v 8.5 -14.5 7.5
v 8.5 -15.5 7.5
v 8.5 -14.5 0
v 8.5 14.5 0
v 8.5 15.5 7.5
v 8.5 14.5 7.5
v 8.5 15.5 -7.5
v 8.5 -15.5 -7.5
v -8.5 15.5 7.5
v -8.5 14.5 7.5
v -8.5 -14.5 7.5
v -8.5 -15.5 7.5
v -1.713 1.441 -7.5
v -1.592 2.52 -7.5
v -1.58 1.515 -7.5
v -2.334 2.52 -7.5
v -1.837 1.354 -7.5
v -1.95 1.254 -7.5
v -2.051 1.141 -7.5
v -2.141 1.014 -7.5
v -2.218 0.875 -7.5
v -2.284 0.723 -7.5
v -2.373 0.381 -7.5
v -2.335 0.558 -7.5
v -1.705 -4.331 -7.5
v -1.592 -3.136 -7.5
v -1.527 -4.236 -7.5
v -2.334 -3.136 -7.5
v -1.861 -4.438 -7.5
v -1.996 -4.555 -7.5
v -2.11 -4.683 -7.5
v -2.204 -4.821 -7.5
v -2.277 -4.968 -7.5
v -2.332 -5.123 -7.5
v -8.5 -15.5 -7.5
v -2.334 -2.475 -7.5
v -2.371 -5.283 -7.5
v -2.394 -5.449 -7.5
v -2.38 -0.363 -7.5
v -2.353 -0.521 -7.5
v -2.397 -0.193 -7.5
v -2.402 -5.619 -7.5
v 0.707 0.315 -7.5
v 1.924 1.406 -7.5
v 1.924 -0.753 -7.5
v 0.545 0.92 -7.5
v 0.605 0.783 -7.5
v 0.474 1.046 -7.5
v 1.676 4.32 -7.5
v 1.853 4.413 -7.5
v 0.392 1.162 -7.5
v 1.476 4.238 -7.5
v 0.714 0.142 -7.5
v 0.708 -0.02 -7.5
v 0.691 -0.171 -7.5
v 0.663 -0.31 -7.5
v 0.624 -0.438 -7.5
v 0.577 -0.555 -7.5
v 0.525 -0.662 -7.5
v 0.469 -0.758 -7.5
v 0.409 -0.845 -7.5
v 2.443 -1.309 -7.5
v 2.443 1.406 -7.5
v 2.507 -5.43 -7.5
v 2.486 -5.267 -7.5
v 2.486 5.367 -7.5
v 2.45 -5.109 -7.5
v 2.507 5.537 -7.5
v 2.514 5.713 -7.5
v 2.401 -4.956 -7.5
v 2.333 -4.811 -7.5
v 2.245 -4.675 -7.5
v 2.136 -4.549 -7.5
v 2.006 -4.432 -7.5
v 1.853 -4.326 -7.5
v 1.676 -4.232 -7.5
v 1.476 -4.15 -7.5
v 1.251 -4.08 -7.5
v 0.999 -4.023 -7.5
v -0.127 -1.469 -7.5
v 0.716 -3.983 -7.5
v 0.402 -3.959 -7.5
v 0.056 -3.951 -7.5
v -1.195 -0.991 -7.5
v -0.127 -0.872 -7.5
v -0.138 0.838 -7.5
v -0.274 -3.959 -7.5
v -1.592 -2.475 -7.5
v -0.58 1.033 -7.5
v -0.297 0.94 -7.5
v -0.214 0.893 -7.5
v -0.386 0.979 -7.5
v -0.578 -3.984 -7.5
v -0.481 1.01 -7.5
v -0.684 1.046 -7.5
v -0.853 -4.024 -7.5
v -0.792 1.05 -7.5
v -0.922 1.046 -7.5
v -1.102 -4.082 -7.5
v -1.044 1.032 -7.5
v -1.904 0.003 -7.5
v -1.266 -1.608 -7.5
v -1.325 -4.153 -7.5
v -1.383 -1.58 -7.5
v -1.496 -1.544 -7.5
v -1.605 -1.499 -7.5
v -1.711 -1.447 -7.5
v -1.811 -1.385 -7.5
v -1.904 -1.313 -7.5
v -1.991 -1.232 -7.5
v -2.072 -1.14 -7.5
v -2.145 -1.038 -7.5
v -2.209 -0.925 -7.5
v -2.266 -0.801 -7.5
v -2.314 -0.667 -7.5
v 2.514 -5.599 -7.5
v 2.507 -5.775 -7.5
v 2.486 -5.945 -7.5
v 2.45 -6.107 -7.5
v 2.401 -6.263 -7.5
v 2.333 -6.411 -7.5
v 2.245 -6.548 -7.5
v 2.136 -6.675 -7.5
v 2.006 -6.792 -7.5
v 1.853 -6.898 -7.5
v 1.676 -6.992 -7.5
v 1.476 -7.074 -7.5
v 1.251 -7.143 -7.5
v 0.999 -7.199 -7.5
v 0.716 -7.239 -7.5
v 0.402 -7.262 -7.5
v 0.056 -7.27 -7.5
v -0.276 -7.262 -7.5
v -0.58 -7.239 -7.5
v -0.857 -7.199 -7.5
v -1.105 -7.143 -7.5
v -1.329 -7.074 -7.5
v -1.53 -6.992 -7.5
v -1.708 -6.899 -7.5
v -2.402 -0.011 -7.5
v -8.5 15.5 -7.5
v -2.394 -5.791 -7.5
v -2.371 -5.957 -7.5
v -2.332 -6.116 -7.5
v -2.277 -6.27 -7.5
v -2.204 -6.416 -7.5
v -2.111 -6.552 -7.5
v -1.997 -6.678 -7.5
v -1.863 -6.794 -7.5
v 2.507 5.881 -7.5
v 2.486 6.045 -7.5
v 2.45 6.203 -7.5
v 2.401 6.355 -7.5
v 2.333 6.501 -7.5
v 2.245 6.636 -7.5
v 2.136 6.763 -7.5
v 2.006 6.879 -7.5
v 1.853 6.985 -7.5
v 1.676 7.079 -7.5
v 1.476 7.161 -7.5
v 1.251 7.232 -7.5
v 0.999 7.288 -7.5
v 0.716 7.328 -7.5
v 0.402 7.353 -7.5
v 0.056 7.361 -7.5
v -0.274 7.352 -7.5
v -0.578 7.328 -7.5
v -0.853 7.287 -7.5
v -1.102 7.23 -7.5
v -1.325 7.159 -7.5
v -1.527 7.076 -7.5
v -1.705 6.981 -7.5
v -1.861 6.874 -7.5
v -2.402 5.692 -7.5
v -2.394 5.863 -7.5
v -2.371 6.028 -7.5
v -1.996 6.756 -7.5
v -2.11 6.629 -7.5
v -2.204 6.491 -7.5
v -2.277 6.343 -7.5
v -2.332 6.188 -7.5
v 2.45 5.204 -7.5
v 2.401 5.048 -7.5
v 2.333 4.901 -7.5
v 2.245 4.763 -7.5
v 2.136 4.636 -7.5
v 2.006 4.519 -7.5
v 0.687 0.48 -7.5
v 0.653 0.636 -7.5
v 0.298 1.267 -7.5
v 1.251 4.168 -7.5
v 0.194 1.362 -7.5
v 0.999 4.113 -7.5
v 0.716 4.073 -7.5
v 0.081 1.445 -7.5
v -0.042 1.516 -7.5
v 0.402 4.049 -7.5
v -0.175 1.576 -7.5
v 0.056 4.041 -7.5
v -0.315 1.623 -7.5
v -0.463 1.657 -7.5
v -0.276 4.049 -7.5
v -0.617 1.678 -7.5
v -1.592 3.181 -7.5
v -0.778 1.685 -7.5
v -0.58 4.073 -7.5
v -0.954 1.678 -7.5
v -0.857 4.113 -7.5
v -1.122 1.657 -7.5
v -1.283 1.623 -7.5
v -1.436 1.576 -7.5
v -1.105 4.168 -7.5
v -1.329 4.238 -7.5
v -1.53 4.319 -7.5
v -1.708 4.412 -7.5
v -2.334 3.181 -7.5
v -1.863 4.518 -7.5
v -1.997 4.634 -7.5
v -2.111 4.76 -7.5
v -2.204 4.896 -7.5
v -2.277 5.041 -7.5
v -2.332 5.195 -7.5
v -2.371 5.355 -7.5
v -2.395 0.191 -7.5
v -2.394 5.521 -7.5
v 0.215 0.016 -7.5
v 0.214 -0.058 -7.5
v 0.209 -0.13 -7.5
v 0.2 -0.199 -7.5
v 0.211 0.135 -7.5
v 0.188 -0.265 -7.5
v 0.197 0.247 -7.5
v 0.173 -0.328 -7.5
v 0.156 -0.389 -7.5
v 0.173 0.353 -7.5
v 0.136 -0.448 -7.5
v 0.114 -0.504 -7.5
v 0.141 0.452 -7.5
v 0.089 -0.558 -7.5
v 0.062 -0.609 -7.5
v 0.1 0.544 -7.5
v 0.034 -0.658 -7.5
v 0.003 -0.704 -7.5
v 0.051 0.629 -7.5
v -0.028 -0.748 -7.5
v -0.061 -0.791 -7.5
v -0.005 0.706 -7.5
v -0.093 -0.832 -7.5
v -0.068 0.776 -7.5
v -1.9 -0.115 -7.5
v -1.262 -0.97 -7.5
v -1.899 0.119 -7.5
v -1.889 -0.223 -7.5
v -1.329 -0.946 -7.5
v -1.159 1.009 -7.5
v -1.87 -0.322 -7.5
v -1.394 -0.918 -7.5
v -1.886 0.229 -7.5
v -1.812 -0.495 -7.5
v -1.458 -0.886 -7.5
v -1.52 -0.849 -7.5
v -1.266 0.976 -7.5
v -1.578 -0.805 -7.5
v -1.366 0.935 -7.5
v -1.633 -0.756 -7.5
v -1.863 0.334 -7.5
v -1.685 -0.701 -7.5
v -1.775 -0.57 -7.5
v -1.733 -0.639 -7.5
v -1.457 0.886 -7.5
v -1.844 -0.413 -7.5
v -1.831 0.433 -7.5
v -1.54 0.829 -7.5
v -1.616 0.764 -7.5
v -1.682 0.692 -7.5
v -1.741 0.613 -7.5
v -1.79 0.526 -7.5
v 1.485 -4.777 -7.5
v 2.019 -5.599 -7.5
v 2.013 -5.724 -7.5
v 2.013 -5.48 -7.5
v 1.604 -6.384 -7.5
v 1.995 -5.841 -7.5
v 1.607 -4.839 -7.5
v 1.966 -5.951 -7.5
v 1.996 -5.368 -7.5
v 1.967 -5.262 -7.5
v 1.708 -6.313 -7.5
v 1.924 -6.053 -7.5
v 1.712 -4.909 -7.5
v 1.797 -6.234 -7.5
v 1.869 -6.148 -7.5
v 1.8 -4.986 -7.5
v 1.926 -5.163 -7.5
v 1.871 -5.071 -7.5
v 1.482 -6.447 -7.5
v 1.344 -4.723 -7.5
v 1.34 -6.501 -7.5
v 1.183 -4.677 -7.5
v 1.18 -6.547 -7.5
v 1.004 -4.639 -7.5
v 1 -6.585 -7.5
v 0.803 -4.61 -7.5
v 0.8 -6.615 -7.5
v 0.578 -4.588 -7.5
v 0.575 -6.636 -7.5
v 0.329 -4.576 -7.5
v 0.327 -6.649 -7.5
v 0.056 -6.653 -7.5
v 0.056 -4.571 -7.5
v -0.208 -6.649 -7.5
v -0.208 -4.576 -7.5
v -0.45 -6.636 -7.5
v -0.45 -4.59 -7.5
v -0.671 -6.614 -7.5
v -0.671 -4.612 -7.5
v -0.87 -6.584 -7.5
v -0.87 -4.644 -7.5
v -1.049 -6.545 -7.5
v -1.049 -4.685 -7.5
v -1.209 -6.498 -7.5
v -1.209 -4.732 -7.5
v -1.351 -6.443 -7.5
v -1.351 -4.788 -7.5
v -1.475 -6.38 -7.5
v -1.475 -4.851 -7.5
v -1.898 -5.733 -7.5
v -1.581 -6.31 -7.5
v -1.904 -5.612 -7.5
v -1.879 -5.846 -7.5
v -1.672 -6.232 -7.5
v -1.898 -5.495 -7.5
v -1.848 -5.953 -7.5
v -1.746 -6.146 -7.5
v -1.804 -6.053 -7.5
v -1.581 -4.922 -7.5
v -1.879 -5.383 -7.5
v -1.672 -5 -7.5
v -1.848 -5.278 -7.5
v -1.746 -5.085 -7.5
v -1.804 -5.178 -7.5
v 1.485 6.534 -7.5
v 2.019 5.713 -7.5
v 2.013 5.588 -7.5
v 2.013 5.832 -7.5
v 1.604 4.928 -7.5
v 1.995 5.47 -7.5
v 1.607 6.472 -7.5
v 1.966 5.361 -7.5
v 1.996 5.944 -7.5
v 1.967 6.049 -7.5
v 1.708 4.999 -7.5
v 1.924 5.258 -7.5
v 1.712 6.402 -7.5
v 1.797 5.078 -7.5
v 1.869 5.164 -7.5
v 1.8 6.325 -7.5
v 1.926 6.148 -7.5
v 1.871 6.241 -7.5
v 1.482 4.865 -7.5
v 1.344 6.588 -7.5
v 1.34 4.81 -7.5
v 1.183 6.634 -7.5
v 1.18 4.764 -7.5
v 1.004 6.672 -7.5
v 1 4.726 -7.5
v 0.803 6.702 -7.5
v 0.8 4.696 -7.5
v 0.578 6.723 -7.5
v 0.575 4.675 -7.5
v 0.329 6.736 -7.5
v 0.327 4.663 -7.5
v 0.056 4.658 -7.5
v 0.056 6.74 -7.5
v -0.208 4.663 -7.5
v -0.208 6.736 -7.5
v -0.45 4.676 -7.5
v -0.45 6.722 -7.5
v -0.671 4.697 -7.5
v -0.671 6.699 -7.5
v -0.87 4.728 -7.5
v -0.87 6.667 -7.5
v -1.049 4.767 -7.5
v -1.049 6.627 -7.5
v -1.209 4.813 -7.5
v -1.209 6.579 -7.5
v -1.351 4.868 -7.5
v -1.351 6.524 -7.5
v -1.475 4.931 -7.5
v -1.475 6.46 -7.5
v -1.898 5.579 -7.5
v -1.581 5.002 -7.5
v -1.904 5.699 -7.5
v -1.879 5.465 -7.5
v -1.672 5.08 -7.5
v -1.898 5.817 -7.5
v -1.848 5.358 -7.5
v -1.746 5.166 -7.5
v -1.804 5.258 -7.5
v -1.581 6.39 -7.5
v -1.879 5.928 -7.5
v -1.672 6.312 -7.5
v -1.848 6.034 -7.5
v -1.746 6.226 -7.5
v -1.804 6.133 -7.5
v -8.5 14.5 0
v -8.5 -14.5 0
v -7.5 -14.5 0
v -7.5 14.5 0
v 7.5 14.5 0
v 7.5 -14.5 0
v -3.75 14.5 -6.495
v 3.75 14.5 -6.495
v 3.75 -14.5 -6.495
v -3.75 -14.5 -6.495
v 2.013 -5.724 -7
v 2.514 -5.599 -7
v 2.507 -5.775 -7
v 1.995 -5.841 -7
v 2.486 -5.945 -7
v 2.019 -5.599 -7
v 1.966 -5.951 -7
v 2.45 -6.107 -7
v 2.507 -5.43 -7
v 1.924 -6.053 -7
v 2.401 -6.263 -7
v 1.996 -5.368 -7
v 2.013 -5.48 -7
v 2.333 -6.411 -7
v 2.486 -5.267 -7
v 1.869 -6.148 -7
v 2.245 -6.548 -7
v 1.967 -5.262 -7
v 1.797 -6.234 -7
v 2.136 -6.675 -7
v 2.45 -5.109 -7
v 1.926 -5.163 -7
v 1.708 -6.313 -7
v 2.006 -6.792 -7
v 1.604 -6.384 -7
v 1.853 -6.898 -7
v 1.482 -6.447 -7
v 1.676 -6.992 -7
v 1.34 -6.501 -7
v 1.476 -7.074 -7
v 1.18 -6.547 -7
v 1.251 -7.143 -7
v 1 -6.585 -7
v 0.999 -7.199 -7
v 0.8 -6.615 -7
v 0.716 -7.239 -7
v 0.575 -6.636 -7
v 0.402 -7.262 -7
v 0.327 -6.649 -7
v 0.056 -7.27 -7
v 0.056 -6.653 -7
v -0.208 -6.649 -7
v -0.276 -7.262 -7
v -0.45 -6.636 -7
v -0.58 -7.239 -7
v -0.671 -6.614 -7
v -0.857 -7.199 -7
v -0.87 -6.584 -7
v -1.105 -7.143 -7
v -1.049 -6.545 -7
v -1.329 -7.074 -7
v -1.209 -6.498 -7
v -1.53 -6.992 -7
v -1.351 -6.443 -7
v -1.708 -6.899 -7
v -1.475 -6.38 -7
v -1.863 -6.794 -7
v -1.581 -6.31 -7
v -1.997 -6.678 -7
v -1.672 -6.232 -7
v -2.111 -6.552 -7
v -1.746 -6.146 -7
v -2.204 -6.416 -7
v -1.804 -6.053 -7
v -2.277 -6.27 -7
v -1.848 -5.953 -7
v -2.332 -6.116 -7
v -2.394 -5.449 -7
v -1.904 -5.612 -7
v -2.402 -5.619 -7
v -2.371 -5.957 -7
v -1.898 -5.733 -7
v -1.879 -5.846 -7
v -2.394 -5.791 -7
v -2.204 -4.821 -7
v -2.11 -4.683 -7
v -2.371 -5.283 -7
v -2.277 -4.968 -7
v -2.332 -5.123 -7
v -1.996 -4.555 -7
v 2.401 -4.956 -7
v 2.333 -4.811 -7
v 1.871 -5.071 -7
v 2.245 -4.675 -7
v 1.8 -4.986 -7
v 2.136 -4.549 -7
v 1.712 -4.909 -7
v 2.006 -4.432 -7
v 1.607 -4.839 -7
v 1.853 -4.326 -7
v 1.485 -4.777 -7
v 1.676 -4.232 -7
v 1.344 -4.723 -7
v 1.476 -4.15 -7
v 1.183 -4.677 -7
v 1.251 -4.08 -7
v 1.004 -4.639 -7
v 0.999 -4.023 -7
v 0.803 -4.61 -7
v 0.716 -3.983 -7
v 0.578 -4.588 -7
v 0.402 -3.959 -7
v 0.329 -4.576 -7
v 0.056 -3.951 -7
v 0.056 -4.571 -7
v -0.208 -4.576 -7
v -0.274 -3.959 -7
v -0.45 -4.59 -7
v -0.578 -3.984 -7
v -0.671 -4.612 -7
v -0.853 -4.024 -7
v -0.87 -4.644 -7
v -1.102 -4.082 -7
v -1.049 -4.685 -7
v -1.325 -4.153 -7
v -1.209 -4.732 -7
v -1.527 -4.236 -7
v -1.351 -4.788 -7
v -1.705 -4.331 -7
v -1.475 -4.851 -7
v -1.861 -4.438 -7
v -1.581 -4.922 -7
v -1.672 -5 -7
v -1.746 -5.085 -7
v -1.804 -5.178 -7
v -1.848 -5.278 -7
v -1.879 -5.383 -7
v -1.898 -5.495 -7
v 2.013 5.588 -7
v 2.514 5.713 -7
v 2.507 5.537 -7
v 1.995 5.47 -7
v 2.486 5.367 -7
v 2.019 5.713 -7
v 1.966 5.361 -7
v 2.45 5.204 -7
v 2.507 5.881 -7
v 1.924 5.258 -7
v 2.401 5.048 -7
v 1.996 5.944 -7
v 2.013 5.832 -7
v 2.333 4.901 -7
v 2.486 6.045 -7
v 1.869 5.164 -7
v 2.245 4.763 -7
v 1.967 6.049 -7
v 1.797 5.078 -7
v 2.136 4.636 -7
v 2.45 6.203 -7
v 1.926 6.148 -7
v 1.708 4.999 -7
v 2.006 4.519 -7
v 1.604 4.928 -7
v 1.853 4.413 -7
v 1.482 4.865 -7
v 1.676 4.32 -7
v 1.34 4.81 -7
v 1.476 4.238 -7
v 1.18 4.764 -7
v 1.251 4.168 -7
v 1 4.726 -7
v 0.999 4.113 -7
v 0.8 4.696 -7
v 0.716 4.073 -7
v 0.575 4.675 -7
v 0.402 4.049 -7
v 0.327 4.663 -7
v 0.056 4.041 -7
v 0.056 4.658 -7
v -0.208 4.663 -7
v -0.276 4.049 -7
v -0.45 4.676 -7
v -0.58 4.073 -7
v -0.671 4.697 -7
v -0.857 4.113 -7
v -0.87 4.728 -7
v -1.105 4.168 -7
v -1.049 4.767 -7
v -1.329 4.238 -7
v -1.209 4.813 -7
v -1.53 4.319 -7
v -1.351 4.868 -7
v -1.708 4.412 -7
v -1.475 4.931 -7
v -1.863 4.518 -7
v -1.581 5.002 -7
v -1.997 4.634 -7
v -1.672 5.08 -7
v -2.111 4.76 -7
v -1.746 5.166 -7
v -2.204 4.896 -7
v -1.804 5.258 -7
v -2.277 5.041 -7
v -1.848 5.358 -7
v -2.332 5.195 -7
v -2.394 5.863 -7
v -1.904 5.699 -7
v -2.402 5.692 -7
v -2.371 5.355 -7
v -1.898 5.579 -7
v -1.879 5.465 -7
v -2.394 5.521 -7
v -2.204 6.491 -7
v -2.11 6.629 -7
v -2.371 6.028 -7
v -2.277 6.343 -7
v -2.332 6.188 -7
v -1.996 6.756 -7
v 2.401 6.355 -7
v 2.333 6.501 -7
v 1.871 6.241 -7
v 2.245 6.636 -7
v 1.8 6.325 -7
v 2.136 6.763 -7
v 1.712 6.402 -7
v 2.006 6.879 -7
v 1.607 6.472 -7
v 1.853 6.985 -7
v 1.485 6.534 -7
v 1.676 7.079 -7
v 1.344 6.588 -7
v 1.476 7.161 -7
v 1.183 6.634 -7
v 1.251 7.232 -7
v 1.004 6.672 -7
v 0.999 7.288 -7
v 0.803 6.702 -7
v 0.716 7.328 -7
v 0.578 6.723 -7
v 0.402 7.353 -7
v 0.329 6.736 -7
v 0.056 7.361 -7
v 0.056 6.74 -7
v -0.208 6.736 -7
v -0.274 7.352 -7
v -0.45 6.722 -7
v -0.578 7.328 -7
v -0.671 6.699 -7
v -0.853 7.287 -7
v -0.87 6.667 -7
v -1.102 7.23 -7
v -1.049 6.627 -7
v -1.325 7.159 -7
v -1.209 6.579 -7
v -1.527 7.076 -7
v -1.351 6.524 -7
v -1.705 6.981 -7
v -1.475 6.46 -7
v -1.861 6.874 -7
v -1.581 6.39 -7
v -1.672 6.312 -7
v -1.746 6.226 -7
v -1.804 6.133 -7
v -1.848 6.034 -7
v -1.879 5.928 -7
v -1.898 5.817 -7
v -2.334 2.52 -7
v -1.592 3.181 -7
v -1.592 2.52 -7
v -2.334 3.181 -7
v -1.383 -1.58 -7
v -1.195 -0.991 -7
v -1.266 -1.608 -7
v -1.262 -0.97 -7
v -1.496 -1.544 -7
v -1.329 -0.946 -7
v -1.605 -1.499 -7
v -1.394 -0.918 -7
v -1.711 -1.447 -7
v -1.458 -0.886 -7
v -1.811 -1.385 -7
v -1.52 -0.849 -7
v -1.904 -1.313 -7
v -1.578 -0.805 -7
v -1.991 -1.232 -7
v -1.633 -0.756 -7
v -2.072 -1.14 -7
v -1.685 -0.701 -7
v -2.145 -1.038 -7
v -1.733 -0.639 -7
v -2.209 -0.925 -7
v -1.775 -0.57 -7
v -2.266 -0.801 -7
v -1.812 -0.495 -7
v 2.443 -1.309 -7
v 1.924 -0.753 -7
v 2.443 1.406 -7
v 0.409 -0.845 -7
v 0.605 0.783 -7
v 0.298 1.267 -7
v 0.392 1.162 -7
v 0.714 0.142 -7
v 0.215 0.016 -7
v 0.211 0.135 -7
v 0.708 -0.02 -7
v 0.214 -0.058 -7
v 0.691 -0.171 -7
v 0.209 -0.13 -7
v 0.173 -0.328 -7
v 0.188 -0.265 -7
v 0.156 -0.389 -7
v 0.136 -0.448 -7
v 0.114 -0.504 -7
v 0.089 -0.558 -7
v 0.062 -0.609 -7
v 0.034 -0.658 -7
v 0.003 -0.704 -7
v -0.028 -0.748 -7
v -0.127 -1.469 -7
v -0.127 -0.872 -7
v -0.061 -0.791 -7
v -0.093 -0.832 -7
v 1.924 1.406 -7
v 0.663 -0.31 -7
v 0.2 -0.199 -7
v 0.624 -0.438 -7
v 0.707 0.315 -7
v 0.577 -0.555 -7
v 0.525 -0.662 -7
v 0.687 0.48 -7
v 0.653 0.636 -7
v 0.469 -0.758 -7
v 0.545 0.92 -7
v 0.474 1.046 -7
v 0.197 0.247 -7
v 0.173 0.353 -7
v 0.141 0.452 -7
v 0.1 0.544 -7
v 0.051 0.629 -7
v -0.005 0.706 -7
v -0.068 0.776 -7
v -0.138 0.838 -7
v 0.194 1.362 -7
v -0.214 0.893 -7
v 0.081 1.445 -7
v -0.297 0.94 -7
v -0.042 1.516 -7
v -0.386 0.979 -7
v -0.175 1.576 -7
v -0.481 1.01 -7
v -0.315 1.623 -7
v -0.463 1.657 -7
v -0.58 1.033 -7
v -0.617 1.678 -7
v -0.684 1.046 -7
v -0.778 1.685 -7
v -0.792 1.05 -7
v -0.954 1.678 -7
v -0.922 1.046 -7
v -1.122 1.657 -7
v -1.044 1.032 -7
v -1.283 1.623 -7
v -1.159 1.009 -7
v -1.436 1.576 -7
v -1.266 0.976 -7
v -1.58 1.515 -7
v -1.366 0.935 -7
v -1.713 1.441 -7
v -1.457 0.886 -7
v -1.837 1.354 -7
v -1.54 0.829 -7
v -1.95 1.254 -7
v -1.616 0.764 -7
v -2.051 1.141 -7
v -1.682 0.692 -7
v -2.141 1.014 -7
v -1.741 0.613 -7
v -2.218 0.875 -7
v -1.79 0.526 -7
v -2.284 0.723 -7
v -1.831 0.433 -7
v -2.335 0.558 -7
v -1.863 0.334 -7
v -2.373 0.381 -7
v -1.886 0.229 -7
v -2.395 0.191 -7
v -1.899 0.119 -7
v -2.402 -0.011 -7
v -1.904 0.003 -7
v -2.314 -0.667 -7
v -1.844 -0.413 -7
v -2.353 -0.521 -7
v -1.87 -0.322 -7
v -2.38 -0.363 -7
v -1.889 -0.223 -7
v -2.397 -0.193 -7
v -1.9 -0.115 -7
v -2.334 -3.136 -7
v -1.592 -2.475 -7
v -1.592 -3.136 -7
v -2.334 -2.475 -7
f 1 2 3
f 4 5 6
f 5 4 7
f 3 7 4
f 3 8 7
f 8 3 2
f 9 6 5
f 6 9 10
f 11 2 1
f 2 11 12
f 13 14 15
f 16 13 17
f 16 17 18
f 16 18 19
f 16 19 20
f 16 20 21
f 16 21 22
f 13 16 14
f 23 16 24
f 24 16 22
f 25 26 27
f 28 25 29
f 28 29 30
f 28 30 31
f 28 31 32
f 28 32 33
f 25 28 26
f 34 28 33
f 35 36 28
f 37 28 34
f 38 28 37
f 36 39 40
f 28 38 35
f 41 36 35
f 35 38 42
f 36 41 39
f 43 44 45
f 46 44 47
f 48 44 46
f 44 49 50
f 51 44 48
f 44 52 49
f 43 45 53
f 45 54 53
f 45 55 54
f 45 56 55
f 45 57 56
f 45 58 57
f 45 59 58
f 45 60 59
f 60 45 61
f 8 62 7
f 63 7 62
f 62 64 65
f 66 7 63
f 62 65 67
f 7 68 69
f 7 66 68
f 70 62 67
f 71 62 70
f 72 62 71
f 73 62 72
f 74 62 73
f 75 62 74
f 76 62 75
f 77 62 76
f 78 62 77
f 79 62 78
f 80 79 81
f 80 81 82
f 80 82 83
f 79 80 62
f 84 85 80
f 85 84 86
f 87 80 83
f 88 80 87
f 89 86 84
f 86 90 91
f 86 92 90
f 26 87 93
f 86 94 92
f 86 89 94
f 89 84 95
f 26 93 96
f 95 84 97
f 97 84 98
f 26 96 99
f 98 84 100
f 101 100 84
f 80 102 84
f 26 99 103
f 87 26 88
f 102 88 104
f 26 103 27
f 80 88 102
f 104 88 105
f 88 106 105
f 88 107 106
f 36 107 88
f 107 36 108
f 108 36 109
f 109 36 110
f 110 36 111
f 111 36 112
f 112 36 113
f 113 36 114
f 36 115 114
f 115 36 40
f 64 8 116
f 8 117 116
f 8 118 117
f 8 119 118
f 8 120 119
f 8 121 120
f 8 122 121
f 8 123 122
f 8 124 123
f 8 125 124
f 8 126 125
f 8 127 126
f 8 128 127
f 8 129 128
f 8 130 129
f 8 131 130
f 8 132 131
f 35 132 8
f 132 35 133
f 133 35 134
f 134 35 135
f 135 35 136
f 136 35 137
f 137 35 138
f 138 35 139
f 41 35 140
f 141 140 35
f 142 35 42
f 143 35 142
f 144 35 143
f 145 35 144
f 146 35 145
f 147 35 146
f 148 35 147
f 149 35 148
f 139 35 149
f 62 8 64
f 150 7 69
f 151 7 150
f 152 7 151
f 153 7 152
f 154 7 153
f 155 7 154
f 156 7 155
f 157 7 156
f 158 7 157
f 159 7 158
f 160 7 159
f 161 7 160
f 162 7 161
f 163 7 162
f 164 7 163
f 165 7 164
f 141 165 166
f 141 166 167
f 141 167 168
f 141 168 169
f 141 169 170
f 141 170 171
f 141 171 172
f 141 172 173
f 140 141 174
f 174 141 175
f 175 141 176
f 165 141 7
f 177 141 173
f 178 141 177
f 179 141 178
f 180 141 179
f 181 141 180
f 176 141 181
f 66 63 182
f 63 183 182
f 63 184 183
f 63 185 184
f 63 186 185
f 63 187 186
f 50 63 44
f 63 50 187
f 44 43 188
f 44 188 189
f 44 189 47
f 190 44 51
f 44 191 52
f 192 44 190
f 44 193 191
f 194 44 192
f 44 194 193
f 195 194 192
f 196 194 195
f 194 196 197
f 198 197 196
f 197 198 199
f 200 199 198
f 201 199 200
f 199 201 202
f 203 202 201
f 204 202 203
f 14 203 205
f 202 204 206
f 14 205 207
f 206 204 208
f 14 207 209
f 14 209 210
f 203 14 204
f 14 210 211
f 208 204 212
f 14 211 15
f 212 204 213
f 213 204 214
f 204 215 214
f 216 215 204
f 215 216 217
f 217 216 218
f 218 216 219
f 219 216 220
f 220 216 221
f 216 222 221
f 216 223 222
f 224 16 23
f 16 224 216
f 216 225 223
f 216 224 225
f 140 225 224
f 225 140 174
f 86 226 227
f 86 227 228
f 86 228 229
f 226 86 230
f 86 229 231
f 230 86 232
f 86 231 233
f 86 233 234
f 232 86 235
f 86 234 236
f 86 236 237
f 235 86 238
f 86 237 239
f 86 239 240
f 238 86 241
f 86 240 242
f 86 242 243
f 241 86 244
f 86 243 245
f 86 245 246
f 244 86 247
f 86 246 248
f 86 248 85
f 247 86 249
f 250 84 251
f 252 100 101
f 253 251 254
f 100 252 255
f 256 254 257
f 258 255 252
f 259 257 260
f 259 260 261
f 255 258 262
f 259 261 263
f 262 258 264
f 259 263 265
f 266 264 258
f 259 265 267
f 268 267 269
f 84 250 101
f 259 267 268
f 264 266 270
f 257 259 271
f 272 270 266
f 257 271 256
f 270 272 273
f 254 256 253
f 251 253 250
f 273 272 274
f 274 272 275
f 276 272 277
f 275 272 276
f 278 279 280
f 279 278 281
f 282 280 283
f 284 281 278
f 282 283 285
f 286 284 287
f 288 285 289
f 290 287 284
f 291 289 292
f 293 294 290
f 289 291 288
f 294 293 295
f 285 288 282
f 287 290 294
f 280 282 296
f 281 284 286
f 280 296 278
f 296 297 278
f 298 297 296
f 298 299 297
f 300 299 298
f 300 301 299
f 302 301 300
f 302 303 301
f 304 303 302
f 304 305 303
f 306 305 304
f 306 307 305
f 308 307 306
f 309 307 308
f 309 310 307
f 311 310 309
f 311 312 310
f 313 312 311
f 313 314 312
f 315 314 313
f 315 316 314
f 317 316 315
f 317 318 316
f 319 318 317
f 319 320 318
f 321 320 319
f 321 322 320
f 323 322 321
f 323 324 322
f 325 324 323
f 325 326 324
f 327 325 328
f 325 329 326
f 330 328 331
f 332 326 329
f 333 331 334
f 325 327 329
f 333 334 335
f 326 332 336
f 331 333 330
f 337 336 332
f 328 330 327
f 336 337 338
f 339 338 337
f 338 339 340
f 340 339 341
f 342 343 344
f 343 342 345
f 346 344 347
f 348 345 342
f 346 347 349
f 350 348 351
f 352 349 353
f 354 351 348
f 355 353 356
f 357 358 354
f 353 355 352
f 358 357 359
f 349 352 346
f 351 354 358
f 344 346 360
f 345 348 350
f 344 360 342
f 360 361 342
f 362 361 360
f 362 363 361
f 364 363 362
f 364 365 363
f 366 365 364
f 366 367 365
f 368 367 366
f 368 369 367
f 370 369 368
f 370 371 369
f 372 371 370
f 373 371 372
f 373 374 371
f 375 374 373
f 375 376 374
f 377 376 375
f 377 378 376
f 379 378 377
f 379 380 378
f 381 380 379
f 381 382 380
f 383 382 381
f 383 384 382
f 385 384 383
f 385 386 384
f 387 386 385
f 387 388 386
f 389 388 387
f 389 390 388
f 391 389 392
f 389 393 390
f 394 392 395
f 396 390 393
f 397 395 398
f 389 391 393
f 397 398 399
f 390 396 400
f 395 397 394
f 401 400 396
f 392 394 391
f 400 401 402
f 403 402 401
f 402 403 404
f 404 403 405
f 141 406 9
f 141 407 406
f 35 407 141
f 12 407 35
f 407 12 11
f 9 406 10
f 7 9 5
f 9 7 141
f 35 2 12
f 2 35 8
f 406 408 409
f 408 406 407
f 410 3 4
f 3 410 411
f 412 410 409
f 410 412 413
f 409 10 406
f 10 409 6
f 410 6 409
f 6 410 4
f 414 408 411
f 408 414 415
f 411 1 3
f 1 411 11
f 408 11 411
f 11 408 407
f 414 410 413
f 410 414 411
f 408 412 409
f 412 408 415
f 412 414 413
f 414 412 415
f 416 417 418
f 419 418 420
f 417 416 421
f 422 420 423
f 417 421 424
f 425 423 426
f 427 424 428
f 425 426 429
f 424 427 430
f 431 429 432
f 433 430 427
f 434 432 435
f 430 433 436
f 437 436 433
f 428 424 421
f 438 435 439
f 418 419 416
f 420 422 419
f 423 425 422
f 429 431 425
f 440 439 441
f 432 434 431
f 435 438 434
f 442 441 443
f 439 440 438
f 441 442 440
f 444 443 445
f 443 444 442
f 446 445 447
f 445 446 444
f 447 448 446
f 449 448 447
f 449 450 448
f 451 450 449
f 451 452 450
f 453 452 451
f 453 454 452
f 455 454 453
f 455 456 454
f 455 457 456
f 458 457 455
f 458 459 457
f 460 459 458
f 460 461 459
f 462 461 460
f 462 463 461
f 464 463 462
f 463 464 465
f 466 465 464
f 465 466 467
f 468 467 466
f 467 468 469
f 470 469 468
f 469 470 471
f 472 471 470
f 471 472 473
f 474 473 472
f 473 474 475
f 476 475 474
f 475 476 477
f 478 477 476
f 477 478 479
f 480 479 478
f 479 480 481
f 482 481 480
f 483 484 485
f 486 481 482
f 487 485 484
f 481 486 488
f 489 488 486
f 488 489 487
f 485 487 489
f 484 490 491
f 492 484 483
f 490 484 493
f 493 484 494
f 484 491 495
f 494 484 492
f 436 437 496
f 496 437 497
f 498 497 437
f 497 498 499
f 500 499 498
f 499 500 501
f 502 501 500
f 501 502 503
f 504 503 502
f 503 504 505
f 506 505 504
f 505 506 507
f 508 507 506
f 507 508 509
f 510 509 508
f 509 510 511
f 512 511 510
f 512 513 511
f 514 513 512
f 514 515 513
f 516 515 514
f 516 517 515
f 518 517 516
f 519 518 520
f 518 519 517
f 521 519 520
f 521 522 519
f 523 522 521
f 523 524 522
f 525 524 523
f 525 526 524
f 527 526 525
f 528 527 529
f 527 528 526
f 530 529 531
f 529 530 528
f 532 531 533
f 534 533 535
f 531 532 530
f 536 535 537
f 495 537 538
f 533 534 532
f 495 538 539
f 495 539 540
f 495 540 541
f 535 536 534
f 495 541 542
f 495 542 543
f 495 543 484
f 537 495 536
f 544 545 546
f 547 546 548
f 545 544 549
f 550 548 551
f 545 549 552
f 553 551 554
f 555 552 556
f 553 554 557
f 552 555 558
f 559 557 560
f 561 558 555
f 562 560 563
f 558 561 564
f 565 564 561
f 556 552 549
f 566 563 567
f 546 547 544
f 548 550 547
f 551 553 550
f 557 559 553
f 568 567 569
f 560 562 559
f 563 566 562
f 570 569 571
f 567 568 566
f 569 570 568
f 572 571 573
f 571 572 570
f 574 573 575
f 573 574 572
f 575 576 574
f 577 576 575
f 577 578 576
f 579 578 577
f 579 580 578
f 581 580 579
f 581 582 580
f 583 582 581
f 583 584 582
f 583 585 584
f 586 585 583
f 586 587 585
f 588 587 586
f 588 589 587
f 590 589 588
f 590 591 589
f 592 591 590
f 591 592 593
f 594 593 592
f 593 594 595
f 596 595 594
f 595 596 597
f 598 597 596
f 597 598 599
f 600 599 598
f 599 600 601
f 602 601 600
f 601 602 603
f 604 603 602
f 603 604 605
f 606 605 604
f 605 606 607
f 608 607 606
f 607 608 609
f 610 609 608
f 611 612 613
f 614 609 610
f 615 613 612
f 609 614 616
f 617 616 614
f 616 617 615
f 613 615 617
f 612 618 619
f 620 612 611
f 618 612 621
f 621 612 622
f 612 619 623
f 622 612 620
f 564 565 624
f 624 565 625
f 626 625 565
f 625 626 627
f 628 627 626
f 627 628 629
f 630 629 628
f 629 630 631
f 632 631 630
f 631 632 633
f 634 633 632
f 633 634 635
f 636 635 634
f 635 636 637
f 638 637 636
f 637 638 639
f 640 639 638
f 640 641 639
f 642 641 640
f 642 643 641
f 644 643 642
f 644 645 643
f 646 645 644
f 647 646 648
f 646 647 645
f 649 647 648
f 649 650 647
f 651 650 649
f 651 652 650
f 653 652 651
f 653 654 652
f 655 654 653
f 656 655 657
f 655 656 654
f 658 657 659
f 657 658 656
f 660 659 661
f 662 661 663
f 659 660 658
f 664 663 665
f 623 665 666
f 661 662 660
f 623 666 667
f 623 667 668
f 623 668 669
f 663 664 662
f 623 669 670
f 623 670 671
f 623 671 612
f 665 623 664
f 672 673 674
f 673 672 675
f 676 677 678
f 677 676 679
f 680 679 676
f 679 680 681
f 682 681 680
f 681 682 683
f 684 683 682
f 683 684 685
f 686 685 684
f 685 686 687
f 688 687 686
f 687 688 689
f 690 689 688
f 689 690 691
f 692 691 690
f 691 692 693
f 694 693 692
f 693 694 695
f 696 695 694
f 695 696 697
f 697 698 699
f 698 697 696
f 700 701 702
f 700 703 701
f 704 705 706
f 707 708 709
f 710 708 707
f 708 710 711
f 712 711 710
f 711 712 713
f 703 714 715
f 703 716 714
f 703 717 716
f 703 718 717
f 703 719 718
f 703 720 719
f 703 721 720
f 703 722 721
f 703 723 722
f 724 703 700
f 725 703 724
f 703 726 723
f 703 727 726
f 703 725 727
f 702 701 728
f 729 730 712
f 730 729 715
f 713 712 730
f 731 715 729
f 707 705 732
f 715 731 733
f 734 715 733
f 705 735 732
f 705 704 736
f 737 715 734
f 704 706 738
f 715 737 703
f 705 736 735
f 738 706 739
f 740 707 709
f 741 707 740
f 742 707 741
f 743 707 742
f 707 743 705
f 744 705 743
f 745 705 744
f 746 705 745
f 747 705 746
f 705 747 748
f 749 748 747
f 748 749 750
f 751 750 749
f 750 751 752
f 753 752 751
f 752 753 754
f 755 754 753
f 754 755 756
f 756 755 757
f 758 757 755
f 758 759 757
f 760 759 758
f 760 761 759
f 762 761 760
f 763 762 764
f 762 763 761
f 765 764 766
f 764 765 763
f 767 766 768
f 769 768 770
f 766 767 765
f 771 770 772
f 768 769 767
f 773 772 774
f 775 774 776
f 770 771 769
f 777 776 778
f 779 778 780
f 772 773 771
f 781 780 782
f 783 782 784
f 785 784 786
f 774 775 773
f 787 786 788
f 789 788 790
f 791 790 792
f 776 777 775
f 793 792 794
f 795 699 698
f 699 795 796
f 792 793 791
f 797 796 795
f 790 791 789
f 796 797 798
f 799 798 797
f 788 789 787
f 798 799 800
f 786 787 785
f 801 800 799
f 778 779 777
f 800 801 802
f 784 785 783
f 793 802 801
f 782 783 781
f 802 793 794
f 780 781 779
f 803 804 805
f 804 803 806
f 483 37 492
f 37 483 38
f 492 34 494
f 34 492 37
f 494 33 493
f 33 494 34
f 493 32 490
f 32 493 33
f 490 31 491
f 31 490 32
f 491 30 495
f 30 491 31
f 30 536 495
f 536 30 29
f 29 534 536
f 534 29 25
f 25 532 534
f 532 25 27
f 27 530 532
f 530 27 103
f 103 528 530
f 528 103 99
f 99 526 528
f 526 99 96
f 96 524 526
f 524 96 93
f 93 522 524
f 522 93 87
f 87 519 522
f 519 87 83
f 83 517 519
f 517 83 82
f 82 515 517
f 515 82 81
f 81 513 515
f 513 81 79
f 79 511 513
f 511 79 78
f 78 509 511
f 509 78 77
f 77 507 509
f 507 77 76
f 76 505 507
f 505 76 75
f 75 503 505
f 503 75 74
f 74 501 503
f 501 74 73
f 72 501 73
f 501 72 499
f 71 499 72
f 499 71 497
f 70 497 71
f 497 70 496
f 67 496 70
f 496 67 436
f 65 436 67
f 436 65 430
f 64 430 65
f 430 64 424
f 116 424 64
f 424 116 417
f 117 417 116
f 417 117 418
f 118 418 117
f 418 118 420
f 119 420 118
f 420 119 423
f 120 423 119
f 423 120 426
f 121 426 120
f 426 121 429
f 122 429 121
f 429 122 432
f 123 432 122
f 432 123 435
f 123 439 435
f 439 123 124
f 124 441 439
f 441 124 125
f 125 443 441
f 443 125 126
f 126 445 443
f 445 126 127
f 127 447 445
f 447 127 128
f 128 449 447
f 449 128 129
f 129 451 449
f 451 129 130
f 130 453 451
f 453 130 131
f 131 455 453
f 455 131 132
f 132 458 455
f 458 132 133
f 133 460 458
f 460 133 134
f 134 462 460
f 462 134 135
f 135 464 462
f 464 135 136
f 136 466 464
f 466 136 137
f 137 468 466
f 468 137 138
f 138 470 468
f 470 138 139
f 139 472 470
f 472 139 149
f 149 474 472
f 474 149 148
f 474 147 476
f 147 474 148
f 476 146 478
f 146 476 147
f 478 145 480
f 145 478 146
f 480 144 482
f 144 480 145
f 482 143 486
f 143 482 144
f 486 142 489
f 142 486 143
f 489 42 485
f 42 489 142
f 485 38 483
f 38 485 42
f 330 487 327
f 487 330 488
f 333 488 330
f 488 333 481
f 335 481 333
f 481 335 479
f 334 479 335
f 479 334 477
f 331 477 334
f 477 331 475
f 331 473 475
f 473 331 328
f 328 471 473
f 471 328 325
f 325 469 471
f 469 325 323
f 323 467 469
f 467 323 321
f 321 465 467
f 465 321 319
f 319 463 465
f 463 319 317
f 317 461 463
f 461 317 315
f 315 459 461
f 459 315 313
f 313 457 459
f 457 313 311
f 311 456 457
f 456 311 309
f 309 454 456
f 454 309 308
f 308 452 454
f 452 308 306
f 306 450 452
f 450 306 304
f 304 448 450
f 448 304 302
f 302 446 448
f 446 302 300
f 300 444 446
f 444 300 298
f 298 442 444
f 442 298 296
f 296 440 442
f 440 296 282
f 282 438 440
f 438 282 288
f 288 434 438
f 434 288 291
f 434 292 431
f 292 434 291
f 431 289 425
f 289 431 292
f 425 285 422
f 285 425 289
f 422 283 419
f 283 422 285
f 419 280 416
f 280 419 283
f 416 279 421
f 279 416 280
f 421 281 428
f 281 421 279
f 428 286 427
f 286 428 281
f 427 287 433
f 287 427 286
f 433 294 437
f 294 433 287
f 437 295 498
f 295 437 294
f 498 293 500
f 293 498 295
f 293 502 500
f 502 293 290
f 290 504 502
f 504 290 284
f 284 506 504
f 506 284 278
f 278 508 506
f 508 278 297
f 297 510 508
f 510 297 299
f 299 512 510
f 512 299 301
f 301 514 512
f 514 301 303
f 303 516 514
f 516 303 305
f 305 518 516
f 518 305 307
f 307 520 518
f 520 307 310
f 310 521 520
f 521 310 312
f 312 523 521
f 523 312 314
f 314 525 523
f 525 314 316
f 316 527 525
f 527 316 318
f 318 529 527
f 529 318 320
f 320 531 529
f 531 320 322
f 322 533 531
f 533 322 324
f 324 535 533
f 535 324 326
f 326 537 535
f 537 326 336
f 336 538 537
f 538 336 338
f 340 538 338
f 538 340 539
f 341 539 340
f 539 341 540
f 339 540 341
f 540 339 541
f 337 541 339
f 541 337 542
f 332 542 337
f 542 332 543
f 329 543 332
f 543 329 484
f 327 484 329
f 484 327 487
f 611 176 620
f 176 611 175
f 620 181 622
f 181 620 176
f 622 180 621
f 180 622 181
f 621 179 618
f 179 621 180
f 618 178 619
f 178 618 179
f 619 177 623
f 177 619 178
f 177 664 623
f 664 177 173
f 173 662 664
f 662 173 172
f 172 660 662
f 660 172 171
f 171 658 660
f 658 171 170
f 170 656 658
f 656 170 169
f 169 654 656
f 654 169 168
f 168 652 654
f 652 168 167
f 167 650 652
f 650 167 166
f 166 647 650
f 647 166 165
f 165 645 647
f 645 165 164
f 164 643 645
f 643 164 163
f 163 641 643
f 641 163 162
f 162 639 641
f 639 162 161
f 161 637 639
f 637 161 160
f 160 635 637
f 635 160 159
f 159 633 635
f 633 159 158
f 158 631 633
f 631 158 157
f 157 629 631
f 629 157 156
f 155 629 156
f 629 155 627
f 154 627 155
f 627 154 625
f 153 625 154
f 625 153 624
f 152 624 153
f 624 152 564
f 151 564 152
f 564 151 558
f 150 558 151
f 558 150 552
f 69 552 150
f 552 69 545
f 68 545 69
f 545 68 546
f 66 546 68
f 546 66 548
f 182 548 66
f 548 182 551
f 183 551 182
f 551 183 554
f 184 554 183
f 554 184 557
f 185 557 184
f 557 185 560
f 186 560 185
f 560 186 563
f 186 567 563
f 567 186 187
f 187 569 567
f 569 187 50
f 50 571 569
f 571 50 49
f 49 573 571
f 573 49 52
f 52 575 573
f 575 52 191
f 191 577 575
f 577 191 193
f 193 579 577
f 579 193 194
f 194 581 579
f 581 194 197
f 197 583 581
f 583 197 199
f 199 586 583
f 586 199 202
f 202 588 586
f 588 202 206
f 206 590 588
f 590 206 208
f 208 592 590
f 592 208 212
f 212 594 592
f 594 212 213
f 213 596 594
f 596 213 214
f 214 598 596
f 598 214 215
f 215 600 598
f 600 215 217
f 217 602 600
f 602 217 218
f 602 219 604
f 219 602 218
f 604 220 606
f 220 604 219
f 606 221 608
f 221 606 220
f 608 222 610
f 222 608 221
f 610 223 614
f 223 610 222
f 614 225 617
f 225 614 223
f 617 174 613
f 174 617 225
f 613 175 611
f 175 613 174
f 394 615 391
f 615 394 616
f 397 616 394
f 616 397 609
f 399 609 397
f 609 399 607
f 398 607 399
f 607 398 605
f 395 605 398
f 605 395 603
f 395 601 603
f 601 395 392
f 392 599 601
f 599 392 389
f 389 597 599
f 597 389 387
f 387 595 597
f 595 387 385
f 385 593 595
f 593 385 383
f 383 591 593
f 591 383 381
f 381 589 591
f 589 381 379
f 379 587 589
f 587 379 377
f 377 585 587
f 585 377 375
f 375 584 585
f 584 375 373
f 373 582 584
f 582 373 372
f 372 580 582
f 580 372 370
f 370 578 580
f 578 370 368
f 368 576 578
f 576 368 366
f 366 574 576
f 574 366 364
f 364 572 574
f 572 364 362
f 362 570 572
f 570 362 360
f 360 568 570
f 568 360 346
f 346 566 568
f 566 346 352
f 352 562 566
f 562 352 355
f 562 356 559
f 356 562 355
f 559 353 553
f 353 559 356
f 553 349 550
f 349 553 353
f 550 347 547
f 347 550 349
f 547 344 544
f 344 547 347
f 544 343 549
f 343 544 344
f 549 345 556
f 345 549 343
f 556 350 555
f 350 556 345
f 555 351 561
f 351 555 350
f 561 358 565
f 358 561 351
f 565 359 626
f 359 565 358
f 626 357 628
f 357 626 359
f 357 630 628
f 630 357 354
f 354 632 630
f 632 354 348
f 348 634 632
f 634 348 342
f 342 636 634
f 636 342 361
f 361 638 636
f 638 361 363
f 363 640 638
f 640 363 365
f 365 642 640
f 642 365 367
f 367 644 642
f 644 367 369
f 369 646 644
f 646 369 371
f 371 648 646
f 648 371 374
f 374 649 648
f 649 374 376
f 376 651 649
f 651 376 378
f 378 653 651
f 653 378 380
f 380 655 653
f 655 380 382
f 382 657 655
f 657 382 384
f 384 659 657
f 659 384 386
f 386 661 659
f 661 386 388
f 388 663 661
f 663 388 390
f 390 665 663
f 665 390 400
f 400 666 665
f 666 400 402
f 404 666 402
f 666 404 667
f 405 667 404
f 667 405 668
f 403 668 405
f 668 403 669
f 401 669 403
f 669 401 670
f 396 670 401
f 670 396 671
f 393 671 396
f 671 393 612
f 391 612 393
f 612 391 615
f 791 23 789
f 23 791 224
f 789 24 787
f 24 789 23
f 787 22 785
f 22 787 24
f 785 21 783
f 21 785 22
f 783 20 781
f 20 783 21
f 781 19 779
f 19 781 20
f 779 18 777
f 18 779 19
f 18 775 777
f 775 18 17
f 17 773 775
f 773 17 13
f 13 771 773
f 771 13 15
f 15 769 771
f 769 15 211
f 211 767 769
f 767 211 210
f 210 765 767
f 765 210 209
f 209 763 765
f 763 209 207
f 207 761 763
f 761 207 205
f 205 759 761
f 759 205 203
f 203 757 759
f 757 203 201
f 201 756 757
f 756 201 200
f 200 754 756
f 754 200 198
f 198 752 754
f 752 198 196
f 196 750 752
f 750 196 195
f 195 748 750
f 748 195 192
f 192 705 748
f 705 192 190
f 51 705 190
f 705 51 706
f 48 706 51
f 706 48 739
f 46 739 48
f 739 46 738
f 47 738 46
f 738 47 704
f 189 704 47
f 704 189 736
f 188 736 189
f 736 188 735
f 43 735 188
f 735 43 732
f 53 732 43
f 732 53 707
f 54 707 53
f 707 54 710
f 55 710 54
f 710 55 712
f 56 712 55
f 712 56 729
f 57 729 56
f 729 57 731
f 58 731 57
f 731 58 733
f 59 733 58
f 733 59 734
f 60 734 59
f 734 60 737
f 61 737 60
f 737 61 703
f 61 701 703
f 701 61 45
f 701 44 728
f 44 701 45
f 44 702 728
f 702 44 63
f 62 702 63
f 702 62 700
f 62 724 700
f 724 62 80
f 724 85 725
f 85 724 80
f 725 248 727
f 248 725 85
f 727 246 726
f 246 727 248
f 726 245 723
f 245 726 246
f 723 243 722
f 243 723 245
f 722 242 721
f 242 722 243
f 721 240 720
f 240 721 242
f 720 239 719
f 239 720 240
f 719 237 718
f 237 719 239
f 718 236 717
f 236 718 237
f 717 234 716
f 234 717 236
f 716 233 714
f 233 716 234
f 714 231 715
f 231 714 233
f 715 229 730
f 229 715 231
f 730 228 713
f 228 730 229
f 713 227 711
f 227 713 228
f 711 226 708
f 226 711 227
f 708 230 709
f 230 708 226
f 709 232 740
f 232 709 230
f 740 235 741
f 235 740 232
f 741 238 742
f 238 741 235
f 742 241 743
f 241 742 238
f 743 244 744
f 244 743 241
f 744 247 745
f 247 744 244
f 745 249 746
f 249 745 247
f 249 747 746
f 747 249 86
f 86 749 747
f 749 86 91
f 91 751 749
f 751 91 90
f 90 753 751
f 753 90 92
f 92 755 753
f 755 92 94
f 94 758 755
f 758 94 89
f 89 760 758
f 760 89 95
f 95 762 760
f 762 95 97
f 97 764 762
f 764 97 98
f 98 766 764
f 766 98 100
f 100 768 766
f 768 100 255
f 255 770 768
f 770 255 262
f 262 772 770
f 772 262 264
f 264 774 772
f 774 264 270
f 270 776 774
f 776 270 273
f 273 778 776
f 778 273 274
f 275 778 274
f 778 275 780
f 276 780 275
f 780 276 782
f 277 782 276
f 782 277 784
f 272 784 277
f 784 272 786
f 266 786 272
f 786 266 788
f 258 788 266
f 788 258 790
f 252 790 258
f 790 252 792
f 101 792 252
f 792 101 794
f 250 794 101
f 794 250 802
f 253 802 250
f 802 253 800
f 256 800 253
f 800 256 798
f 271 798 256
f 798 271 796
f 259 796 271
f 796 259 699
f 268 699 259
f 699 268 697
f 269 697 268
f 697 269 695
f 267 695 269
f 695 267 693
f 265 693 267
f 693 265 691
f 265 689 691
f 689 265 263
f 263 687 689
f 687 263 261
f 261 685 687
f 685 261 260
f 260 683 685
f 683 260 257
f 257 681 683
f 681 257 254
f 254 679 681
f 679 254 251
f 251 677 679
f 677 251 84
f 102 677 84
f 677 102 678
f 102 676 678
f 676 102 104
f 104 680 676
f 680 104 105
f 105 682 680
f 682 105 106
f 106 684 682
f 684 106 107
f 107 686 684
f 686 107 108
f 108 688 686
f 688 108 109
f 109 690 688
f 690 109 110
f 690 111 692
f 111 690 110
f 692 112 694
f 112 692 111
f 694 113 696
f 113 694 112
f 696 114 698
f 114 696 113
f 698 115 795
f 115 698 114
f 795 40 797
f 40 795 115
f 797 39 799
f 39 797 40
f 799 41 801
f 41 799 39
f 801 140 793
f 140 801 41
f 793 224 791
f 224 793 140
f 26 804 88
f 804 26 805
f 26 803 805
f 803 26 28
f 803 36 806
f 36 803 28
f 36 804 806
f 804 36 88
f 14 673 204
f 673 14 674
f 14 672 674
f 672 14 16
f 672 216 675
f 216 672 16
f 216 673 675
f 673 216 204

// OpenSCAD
version = "0.5.0";

function toUnits(inches=0, sixteenths=0) = (inches * 16) + sixteenths;

stackHeight = toUnits(1, 12);
edge = 8;
faceToFace = 13;


voidWidth = 15;
voidLength = stackHeight + 1;

shellLength = voidLength + 2;
shellWidth = voidWidth + 2;
shellDepth = faceToFace + 2;

//linear_extrude (voidLength) {
//    polygon([0,0], [edge,0],[0,edge]);
//}

difference() {
    
    // shell
    cube ([shellWidth, shellLength, shellDepth],true);
    
    // open top
    translate ([0,0,shellDepth / 2]) cube ([shellWidth + 2, voidLength, faceToFace  + 2], true);
    
    // channel
    translate ([0, voidLength / 2, 0]) rotate ([90,0,0]) linear_extrude(voidLength) circle(voidWidth / 2, $fn=6);
    
    // version
    translate ([0, 0, - (shellDepth/2) + 0.5 ])
    rotate ([0,180,270])
        linear_extrude (1) {
            scale (.5, .5, .5)
            text(version, halign = "center", valign = "center");
        } ;
    
}
